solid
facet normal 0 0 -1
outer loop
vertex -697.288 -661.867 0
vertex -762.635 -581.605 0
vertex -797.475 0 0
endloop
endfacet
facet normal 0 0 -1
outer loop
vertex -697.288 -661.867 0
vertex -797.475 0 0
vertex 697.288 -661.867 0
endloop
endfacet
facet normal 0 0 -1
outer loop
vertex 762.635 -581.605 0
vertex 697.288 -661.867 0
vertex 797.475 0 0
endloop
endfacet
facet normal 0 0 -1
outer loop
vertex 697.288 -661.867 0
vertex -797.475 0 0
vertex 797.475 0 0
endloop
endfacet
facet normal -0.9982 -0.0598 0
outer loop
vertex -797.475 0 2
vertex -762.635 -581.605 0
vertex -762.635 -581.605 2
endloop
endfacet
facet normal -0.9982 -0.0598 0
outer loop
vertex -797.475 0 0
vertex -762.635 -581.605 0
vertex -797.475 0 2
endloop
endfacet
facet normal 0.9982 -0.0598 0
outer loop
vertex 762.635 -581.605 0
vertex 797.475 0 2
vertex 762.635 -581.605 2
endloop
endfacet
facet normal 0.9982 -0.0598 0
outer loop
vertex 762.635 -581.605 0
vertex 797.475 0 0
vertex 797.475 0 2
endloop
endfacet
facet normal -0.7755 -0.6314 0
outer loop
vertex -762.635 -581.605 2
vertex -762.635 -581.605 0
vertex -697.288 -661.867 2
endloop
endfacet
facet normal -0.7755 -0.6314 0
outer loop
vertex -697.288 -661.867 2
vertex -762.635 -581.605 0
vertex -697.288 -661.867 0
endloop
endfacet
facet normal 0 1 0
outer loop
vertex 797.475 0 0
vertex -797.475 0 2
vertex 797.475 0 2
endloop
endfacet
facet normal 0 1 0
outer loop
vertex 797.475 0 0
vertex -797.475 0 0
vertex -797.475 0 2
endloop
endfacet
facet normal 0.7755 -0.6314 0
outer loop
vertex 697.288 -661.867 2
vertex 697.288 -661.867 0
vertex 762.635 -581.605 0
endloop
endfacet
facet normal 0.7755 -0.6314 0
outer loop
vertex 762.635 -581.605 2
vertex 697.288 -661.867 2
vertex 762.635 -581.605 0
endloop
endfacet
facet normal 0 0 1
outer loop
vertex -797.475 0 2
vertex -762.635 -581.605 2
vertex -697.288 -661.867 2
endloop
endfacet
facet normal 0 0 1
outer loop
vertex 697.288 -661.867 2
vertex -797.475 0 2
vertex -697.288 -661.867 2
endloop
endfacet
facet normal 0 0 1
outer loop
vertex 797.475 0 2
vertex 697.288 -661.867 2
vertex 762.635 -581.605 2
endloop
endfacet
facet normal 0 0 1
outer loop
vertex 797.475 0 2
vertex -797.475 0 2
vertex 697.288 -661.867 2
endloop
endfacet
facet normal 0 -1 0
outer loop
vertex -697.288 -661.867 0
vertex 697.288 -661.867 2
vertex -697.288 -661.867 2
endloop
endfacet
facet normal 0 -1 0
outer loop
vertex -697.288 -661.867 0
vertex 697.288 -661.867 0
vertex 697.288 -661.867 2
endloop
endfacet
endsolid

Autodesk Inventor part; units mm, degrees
ref_plane "YZ Plane" through (0, 0, 0) normal (1, 0, 0) x (0, 1, 0)
ref_plane "XZ Plane" through (0, 0, 0) normal (0, 1, 0) x (-1, 0, 0)
ref_plane "XY Plane" through (0, 0, 0) normal (0, 0, 1) x (1, 0, 0)
sketch "Sketch1" plane through (0, 0, 0) normal (0, 0, 1) x (1, 0, 0)
  line L0 (797.4752, 0) -> (797.4752, -661.8669) construction
  line L1 (797.4752, -661.8669) -> (0, -661.8669)
  line L2 (751.1573, -579.8638) -> (684.3931, -661.8669) construction
  ellipse E0 centre (-10250, 795.2799) end of major axis (-10250.7907, -13633.3868) minor radius 11053 (753.0187, -574.9033) -> (782.4805, -83.0791) ccw construction
  line L3 (797.4752, 0) -> (762.6352, -581.6047)
  line L4 (697.2883, -661.8669) -> (797.4752, -538.8126)
  line L5 (753.0187, -574.9033) -> (763.0008, -575.5013) construction
  line L6 (782.4805, -83.0791) -> (792.4626, -83.6771) construction
  line L7 (0, -661.8669) -> (0, 0)
  line L8 (0, 0) -> (797.4752, 0)
  dimension "d3" = 10
  dimension "d4" = 10
  dimension "d5" = 10
extrude "Plate1" add sketch "Sketch1" along normal blind 2
mirror "Mirror1" about plane through (0, 0, 0) normal (1, 0, 0)
sketch "Sketch2" plane through (0, 0, 2) normal (0, 0, 1) x (1, 0, 0)
  line L0 (-55, -611.8669) -> (-55, -599.8669) construction
  line L1 (-55, -599.8669) -> (55, -599.8669) construction
  line L2 (55, -599.8669) -> (55, -611.8669) construction
  line L3 (55, -611.8669) -> (-55, -611.8669) construction
  line L4 (-697.2883, -661.8669) -> (697.2883, -661.8669) projected
  point P0 (0, 0)
  point P1 (0, -611.8669)
  point P2 (0, -661.8669)
  dimension "d6" = 12
  dimension "d7" = 110
  dimension "d8" = 50
mark "Mark1"
equation "\"d2\" = Thickness"
equation "\"BendReliefWidth\" = Thickness"
equation "\"BendReliefDepth\" = 0.5 * Thickness"
equation "\"CornerReliefSize\" = 4 * Thickness"
equation "\"MinimumRemnant\" = 2 * Thickness"
equation "\"TransitionRadius\" = BendRadius"
equation "\"JacobiRadiusSize\" = BendRadius"
equation "\"GapSize\" = Thickness"
equation "\"Thickness\" = 2"
equation "\"BendRadius\" = 2.75"
properties part number "MSC 075 face 2" material "AISI304"
